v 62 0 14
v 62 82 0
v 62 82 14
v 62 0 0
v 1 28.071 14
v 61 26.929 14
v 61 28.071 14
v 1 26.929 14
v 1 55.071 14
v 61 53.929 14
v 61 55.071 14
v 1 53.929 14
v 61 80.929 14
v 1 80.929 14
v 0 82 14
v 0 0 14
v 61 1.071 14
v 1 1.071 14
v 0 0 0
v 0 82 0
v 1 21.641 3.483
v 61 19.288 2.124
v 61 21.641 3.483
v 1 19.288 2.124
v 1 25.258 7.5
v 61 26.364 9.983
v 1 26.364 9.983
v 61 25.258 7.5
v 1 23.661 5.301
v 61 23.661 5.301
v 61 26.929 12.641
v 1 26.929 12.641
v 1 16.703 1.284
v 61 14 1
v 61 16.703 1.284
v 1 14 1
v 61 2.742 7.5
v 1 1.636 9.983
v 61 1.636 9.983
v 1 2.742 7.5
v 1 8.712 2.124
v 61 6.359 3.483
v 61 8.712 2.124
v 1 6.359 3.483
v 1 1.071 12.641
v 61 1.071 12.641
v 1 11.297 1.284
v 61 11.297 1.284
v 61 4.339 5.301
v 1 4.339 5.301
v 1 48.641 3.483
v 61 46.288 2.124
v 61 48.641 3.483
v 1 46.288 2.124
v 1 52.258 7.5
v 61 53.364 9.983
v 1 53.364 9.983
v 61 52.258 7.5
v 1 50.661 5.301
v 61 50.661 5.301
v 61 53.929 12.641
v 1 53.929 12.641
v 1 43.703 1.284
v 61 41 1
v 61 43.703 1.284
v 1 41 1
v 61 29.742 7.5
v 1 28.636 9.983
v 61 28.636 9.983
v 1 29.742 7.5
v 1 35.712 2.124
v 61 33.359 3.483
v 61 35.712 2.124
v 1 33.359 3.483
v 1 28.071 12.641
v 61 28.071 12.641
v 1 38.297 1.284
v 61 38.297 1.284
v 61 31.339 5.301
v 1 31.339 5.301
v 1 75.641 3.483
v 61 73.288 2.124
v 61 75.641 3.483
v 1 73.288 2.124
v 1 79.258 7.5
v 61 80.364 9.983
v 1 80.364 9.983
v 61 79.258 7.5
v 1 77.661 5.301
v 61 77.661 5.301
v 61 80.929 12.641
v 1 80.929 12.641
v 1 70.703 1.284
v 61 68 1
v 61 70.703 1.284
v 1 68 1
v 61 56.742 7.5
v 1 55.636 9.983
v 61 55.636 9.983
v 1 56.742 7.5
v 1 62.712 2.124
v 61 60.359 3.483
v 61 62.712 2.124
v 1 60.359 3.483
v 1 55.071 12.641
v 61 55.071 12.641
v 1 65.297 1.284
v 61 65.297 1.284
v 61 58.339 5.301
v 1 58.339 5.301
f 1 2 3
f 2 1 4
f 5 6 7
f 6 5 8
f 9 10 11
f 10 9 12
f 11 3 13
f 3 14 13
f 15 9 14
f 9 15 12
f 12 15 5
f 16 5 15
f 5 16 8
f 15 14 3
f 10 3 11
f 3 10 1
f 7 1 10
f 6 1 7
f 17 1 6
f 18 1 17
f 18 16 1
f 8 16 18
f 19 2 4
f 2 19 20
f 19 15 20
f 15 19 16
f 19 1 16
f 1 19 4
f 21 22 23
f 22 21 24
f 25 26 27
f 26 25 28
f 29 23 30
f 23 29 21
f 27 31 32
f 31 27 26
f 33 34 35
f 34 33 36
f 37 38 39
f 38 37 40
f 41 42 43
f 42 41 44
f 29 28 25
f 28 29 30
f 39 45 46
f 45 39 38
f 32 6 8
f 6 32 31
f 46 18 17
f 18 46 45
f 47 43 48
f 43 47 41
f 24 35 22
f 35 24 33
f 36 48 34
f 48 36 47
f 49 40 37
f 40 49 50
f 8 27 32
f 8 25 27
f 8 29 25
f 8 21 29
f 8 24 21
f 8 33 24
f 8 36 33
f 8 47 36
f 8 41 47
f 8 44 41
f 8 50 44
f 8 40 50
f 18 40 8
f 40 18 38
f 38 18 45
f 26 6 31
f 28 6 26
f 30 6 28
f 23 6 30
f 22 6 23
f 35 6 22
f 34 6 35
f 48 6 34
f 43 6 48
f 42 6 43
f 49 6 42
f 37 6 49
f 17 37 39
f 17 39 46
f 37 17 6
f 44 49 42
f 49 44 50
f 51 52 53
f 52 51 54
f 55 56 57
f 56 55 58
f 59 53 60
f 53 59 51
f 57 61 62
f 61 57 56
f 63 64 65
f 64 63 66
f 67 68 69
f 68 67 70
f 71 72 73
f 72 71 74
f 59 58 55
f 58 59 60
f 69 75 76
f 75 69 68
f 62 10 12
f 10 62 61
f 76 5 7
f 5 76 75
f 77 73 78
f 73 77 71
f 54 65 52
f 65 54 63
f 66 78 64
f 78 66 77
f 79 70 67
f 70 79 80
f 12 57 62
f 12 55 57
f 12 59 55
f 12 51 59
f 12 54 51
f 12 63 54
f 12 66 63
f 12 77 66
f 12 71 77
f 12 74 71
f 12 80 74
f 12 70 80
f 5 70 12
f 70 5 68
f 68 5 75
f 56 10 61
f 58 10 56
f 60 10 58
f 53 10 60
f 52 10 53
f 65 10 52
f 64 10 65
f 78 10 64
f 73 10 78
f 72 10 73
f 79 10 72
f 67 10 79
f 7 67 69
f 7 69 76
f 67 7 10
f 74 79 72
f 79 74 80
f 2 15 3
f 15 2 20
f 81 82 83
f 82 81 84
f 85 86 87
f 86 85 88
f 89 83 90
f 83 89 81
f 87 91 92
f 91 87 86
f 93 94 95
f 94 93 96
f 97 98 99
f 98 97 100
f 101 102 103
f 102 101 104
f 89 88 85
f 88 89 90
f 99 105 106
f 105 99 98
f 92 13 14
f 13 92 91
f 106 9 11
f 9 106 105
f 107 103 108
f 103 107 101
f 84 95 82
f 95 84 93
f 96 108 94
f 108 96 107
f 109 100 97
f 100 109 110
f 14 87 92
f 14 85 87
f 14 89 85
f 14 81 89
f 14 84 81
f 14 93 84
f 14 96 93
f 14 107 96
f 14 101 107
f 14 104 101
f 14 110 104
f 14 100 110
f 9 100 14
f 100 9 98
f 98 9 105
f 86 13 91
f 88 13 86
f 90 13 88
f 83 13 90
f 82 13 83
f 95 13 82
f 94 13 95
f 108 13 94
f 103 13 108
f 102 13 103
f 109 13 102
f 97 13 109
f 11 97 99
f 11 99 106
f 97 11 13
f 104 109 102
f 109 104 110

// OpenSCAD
function minimum_wall_thickness() = 1; // mm
function clearance() = 1;

function total_width(d, t) = d + 2 * t;
function total_length(l, t) = l + 2 * t;

module horizontal_coin_holder(
  d, // coin diameter
  l, // compartment inner length
  t = minimum_wall_thickness(), // minimum_wall_thickness
) {
    d = d + clearance();
    r = d / 2;
    outer_width = total_width(d = d, t = t);
    outer_length = total_length(l = l, t = t);
    outer_d = d + 2 * minimum_wall_thickness();

    cylinder_offset_x = t;
    cylinder_offset_y = t + r;
    cylinder_offset_z = t + r;

    difference() {
        cube([outer_length, outer_d, outer_d / 2]);
        translate([cylinder_offset_x, cylinder_offset_y, cylinder_offset_z]) rotate([0, 90, 0]) cylinder(d = d, h = l);
    }
}

module multi_horizontal_coin_holder(
  d, // coin diameter
  l, // compartment inner length
  t = minimum_wall_thickness(), // minimum_wall_thickness
  c = 2, // compartment count
) {
    union()
    for(i = [0:c - 1]) {
        offset_y = total_width(d = d, t = t) * i;
        translate([0, offset_y, 0]) horizontal_coin_holder(d = d, l = l, t = t);
    }
}

multi_horizontal_coin_holder(d = 25, l = 60, c = 3);
